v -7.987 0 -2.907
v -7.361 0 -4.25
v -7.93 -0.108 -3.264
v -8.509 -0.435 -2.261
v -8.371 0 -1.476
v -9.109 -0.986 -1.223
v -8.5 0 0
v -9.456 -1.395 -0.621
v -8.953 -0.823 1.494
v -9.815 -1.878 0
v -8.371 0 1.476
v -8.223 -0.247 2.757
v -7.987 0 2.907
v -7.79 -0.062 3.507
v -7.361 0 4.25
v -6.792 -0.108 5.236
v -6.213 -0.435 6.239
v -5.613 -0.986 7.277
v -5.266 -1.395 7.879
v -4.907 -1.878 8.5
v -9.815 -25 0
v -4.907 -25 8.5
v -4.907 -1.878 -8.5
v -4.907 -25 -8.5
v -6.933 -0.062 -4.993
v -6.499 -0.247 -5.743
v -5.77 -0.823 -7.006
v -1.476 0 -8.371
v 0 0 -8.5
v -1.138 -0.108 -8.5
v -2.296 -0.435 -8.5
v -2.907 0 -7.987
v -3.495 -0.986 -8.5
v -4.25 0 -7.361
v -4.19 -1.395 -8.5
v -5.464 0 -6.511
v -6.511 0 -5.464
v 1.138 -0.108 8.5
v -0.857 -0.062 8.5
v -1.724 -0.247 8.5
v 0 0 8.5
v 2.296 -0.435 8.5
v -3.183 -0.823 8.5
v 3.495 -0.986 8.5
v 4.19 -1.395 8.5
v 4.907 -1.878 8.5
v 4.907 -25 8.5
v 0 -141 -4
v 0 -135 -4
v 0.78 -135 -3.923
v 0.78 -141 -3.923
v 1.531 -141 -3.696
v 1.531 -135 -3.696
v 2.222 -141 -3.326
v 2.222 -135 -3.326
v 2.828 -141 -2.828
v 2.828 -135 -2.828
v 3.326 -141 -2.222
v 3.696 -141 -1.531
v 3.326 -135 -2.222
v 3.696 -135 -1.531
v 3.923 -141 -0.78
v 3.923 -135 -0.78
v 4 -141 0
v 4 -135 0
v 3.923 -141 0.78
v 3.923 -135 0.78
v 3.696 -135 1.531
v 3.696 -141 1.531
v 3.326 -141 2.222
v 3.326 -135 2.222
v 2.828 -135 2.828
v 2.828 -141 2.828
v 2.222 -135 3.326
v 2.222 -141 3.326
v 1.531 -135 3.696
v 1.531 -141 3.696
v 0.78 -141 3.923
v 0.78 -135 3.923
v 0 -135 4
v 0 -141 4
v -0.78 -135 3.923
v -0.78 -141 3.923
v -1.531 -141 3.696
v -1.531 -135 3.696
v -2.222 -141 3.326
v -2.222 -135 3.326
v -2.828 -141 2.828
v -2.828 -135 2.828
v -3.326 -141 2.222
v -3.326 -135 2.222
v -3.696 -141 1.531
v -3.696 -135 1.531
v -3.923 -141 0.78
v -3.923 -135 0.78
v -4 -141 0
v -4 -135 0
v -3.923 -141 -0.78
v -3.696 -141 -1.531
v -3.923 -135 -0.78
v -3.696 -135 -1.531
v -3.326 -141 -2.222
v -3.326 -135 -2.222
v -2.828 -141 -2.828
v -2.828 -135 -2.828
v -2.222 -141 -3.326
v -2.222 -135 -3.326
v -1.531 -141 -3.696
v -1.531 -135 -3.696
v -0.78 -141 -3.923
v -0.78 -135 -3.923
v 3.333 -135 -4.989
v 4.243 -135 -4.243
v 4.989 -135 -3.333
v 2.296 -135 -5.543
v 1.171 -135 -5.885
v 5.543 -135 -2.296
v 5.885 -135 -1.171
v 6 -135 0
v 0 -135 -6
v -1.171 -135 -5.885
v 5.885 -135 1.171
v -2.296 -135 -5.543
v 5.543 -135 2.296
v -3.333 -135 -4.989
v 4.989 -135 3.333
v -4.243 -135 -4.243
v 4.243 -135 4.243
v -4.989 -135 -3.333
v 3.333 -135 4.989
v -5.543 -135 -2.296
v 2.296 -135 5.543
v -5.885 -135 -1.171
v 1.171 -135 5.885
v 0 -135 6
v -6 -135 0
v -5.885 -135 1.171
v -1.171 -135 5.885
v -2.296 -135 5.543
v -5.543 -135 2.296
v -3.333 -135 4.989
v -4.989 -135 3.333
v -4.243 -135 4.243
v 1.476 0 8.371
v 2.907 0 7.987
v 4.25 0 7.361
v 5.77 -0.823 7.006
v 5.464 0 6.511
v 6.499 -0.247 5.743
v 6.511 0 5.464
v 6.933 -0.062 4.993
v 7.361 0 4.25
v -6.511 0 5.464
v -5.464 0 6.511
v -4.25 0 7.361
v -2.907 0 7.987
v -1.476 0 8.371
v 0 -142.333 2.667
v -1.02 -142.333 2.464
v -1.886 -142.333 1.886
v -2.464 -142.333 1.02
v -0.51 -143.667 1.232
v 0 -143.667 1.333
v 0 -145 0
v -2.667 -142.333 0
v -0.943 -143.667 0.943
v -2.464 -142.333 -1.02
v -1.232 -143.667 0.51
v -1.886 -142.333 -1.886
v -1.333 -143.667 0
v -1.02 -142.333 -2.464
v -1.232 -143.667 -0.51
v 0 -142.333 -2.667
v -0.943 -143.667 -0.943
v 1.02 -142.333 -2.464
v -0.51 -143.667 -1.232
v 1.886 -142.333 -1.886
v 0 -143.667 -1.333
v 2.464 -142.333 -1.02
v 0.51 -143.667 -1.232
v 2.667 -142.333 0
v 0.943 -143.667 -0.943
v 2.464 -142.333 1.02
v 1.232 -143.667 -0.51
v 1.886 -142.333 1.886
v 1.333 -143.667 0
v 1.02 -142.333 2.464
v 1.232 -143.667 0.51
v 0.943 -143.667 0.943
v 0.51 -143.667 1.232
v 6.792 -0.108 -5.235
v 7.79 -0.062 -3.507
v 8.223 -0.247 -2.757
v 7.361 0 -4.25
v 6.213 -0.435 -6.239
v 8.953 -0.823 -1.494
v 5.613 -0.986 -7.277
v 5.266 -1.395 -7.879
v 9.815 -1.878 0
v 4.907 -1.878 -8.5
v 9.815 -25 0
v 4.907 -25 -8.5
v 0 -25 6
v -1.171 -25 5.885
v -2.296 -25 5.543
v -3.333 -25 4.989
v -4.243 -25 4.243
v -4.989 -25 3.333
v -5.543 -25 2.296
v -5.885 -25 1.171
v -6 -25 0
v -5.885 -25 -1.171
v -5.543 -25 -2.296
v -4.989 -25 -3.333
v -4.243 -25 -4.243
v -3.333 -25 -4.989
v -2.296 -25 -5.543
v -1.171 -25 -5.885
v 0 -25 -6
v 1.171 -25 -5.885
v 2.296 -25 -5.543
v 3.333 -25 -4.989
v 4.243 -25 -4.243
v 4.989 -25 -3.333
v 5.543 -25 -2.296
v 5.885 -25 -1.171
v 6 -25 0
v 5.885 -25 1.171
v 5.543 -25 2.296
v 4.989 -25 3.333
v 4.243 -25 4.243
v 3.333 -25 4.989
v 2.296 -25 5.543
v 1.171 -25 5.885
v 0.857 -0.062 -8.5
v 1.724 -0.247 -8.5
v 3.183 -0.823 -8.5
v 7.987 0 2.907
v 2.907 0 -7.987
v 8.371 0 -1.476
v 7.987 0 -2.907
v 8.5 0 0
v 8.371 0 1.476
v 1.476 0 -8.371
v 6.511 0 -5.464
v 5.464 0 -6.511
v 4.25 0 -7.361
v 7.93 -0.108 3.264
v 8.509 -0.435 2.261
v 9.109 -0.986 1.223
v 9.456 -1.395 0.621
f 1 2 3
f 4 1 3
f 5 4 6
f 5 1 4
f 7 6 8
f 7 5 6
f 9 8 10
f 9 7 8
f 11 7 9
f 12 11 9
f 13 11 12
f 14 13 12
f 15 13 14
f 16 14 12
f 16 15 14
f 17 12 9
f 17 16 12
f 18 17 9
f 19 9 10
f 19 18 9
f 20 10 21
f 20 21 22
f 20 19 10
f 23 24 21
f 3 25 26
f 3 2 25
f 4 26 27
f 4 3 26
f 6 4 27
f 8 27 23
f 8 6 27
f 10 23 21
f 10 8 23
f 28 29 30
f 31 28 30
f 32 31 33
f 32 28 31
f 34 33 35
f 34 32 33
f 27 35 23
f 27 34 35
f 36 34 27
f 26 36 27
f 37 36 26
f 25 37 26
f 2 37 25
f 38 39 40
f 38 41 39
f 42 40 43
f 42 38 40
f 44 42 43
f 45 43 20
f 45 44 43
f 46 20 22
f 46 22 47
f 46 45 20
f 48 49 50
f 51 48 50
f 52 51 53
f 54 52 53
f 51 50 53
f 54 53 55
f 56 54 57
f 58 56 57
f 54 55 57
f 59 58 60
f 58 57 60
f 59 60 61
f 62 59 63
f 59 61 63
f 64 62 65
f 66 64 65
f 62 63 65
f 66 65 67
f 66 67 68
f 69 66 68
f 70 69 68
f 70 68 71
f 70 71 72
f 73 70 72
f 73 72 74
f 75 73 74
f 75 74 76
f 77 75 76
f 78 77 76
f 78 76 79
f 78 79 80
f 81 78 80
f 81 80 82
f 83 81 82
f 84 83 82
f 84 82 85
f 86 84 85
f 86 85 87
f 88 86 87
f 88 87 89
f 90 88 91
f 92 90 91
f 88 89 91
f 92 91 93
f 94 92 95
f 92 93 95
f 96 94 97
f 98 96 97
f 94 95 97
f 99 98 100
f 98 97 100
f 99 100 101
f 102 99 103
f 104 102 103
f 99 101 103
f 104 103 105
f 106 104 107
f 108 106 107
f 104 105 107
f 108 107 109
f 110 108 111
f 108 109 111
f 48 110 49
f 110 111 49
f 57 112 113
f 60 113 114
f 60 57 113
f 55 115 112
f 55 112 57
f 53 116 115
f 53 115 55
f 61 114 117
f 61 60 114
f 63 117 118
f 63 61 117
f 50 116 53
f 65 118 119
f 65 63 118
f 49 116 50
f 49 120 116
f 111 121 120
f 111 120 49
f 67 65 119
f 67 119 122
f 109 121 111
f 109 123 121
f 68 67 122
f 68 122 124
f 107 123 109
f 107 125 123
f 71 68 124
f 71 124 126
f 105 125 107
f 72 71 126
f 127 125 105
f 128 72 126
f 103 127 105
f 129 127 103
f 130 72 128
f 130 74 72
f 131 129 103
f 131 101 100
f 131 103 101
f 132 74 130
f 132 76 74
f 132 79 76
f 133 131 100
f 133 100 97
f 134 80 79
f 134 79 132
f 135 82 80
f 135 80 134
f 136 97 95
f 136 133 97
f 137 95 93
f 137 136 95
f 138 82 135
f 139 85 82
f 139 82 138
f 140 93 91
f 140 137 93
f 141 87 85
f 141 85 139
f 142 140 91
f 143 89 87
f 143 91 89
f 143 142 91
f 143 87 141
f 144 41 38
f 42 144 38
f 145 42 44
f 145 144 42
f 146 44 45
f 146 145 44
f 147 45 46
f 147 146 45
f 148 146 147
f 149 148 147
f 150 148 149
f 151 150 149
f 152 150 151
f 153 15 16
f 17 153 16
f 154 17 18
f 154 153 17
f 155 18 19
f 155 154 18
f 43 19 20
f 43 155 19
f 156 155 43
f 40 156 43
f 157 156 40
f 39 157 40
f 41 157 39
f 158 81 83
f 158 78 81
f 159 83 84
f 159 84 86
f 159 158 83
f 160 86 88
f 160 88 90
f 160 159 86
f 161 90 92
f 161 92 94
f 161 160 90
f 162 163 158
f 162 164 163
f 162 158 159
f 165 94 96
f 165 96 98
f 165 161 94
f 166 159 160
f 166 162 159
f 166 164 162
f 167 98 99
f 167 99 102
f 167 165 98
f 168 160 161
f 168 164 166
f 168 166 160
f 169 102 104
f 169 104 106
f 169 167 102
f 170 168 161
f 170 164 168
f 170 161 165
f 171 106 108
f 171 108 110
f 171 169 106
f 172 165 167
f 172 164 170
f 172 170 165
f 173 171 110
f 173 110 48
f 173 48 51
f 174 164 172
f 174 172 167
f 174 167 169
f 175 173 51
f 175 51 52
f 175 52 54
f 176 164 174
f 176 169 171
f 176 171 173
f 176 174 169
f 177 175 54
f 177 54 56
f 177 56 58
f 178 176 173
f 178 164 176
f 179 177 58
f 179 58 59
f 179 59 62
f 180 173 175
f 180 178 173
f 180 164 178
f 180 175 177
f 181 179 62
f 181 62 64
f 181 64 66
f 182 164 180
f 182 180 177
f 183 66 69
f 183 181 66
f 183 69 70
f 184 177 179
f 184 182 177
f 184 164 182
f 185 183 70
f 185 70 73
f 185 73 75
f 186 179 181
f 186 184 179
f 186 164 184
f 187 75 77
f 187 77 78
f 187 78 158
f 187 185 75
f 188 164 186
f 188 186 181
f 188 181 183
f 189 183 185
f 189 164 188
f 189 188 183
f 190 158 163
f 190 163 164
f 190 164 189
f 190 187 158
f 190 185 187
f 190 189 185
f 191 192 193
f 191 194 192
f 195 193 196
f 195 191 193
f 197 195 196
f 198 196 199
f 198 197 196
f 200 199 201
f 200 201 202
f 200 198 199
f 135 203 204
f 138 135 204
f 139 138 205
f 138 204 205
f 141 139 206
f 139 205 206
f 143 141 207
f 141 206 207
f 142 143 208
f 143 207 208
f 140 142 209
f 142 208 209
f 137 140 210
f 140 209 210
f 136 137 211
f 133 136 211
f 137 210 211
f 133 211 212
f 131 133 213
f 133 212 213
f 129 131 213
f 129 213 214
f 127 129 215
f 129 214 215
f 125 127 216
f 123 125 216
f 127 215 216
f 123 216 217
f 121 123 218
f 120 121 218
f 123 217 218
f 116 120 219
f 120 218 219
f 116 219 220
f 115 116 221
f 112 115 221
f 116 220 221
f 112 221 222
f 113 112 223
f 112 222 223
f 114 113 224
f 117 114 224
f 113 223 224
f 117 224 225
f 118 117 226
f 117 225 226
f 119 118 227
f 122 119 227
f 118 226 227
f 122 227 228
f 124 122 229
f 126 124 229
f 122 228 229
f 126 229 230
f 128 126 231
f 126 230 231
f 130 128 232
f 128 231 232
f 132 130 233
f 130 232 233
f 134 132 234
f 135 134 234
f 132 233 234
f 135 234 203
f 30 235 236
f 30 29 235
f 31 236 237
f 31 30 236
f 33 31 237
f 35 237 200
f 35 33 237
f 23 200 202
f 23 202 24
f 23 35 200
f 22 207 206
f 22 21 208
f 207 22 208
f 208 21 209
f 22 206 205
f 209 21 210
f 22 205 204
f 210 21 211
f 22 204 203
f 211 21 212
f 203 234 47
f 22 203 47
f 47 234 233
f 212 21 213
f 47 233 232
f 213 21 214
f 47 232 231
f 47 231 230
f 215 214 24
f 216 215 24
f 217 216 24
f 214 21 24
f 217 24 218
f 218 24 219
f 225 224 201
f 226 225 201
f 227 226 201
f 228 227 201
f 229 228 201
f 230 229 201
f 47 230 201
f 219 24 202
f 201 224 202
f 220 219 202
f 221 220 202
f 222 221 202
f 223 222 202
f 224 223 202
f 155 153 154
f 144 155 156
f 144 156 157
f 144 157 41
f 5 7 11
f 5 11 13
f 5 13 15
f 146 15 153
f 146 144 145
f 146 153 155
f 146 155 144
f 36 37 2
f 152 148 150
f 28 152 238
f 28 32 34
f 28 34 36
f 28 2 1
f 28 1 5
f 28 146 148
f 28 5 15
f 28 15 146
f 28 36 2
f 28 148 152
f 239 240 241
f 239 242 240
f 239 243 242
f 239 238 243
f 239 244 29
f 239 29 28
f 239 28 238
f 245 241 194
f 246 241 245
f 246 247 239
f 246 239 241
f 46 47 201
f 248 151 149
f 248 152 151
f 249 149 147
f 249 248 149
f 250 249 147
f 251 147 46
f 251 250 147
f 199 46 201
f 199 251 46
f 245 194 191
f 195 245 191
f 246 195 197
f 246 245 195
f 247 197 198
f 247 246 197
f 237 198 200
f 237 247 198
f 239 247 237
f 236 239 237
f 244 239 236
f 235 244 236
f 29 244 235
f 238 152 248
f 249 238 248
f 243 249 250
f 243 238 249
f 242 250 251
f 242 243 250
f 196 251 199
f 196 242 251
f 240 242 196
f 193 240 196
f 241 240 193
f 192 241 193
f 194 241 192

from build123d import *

# Parameters (mm, degrees)
BOSS_EXTRUDE1_DEPTH = 25
SKETCH2_OUTSIDE_W   = 63.85
SKETCH2_OUTSIDE_H   = 61.22
SKETCH2_OUTSIDE_R   = 8.5
CUT_EXTRUDE1_DEPTH  = 25
CUT_EXTRUDE1_DRAFT  = -35
SKETCH3_R           = 6
BOSS_EXTRUDE2_DEPTH = 110
SKETCH4_R           = 4
BOSS_EXTRUDE3_DEPTH = 6


with BuildPart() as part:
    # Sketch1 → Boss-Extrude1 (new body)
    with BuildSketch(Plane(origin=(0, 0, 0), x_dir=(1, 0, 0), z_dir=(0, 1, 0))):
        Polygon((9.814954576, 0), (4.907477288, 8.5), (-4.907477288, 8.5), (-9.814954576, 0), (-4.907477288, -8.5), (4.907477288, -8.5), align=None)
    extrude(amount=-BOSS_EXTRUDE1_DEPTH)


with BuildPart() as cut_extrude1_tool:
    # Sketch2 outside → Cut-Extrude1 (with draft: the straight prism first)
    with BuildSketch(Plane(origin=(0, 0, 0), x_dir=(1, 0, 0), z_dir=(0, 1, 0))):
        Rectangle(SKETCH2_OUTSIDE_W, SKETCH2_OUTSIDE_H)
        Circle(SKETCH2_OUTSIDE_R, mode=Mode.SUBTRACT)
    extrude(amount=-CUT_EXTRUDE1_DEPTH)
    # Cut-Extrude1: the draft: its side faces are tilted about the plane it starts from
    cut_extrude1_sides = [cut_extrude1_tool.faces().sort_by_distance(p)[0] for p in [
        (0, -12.5, 30.61),
        (31.925, -12.5, 0),
        (0, -12.5, -30.61),
        (-31.925, -12.5, 0),
        (-8.5, -12.5, 0),
    ]]
    draft(cut_extrude1_sides, Plane(origin=(0, 0, 0), x_dir=(1, 0, 0), z_dir=(0, 1, 0)), CUT_EXTRUDE1_DRAFT)


with BuildPart() as part_1:
    add(part.part)

    # Cut-Extrude1: cut by cut_extrude1_tool
    add(cut_extrude1_tool.part, mode=Mode.SUBTRACT)

    # Sketch3 → Boss-Extrude2 (add)
    with BuildSketch(Plane.XZ.offset(25)):
        with Locations(Location((0, 0, 0), (0, 0, 90))):
            Circle(SKETCH3_R)
    extrude(amount=BOSS_EXTRUDE2_DEPTH)

    # Sketch4 → Boss-Extrude3 (add)
    with BuildSketch(Plane.XZ.offset(135)):
        with Locations(Location((0, 0, 0), (0, 0, 270))):
            Circle(SKETCH4_R)
    extrude(amount=BOSS_EXTRUDE3_DEPTH)

    # Boss-Extrude4 cone 1 section (through the dimple's axis) → Boss-Extrude4 (revolve)
    with BuildSketch(Plane(origin=(0, -141, 0), x_dir=(0, 0, 1), z_dir=(1, 0, 0))):
        Polygon((0, 0), (4, 0), (0, 4), align=None)
    revolve(axis=Axis((0, -141, 0), (0, -1, 0)))


solid = part_1.part
